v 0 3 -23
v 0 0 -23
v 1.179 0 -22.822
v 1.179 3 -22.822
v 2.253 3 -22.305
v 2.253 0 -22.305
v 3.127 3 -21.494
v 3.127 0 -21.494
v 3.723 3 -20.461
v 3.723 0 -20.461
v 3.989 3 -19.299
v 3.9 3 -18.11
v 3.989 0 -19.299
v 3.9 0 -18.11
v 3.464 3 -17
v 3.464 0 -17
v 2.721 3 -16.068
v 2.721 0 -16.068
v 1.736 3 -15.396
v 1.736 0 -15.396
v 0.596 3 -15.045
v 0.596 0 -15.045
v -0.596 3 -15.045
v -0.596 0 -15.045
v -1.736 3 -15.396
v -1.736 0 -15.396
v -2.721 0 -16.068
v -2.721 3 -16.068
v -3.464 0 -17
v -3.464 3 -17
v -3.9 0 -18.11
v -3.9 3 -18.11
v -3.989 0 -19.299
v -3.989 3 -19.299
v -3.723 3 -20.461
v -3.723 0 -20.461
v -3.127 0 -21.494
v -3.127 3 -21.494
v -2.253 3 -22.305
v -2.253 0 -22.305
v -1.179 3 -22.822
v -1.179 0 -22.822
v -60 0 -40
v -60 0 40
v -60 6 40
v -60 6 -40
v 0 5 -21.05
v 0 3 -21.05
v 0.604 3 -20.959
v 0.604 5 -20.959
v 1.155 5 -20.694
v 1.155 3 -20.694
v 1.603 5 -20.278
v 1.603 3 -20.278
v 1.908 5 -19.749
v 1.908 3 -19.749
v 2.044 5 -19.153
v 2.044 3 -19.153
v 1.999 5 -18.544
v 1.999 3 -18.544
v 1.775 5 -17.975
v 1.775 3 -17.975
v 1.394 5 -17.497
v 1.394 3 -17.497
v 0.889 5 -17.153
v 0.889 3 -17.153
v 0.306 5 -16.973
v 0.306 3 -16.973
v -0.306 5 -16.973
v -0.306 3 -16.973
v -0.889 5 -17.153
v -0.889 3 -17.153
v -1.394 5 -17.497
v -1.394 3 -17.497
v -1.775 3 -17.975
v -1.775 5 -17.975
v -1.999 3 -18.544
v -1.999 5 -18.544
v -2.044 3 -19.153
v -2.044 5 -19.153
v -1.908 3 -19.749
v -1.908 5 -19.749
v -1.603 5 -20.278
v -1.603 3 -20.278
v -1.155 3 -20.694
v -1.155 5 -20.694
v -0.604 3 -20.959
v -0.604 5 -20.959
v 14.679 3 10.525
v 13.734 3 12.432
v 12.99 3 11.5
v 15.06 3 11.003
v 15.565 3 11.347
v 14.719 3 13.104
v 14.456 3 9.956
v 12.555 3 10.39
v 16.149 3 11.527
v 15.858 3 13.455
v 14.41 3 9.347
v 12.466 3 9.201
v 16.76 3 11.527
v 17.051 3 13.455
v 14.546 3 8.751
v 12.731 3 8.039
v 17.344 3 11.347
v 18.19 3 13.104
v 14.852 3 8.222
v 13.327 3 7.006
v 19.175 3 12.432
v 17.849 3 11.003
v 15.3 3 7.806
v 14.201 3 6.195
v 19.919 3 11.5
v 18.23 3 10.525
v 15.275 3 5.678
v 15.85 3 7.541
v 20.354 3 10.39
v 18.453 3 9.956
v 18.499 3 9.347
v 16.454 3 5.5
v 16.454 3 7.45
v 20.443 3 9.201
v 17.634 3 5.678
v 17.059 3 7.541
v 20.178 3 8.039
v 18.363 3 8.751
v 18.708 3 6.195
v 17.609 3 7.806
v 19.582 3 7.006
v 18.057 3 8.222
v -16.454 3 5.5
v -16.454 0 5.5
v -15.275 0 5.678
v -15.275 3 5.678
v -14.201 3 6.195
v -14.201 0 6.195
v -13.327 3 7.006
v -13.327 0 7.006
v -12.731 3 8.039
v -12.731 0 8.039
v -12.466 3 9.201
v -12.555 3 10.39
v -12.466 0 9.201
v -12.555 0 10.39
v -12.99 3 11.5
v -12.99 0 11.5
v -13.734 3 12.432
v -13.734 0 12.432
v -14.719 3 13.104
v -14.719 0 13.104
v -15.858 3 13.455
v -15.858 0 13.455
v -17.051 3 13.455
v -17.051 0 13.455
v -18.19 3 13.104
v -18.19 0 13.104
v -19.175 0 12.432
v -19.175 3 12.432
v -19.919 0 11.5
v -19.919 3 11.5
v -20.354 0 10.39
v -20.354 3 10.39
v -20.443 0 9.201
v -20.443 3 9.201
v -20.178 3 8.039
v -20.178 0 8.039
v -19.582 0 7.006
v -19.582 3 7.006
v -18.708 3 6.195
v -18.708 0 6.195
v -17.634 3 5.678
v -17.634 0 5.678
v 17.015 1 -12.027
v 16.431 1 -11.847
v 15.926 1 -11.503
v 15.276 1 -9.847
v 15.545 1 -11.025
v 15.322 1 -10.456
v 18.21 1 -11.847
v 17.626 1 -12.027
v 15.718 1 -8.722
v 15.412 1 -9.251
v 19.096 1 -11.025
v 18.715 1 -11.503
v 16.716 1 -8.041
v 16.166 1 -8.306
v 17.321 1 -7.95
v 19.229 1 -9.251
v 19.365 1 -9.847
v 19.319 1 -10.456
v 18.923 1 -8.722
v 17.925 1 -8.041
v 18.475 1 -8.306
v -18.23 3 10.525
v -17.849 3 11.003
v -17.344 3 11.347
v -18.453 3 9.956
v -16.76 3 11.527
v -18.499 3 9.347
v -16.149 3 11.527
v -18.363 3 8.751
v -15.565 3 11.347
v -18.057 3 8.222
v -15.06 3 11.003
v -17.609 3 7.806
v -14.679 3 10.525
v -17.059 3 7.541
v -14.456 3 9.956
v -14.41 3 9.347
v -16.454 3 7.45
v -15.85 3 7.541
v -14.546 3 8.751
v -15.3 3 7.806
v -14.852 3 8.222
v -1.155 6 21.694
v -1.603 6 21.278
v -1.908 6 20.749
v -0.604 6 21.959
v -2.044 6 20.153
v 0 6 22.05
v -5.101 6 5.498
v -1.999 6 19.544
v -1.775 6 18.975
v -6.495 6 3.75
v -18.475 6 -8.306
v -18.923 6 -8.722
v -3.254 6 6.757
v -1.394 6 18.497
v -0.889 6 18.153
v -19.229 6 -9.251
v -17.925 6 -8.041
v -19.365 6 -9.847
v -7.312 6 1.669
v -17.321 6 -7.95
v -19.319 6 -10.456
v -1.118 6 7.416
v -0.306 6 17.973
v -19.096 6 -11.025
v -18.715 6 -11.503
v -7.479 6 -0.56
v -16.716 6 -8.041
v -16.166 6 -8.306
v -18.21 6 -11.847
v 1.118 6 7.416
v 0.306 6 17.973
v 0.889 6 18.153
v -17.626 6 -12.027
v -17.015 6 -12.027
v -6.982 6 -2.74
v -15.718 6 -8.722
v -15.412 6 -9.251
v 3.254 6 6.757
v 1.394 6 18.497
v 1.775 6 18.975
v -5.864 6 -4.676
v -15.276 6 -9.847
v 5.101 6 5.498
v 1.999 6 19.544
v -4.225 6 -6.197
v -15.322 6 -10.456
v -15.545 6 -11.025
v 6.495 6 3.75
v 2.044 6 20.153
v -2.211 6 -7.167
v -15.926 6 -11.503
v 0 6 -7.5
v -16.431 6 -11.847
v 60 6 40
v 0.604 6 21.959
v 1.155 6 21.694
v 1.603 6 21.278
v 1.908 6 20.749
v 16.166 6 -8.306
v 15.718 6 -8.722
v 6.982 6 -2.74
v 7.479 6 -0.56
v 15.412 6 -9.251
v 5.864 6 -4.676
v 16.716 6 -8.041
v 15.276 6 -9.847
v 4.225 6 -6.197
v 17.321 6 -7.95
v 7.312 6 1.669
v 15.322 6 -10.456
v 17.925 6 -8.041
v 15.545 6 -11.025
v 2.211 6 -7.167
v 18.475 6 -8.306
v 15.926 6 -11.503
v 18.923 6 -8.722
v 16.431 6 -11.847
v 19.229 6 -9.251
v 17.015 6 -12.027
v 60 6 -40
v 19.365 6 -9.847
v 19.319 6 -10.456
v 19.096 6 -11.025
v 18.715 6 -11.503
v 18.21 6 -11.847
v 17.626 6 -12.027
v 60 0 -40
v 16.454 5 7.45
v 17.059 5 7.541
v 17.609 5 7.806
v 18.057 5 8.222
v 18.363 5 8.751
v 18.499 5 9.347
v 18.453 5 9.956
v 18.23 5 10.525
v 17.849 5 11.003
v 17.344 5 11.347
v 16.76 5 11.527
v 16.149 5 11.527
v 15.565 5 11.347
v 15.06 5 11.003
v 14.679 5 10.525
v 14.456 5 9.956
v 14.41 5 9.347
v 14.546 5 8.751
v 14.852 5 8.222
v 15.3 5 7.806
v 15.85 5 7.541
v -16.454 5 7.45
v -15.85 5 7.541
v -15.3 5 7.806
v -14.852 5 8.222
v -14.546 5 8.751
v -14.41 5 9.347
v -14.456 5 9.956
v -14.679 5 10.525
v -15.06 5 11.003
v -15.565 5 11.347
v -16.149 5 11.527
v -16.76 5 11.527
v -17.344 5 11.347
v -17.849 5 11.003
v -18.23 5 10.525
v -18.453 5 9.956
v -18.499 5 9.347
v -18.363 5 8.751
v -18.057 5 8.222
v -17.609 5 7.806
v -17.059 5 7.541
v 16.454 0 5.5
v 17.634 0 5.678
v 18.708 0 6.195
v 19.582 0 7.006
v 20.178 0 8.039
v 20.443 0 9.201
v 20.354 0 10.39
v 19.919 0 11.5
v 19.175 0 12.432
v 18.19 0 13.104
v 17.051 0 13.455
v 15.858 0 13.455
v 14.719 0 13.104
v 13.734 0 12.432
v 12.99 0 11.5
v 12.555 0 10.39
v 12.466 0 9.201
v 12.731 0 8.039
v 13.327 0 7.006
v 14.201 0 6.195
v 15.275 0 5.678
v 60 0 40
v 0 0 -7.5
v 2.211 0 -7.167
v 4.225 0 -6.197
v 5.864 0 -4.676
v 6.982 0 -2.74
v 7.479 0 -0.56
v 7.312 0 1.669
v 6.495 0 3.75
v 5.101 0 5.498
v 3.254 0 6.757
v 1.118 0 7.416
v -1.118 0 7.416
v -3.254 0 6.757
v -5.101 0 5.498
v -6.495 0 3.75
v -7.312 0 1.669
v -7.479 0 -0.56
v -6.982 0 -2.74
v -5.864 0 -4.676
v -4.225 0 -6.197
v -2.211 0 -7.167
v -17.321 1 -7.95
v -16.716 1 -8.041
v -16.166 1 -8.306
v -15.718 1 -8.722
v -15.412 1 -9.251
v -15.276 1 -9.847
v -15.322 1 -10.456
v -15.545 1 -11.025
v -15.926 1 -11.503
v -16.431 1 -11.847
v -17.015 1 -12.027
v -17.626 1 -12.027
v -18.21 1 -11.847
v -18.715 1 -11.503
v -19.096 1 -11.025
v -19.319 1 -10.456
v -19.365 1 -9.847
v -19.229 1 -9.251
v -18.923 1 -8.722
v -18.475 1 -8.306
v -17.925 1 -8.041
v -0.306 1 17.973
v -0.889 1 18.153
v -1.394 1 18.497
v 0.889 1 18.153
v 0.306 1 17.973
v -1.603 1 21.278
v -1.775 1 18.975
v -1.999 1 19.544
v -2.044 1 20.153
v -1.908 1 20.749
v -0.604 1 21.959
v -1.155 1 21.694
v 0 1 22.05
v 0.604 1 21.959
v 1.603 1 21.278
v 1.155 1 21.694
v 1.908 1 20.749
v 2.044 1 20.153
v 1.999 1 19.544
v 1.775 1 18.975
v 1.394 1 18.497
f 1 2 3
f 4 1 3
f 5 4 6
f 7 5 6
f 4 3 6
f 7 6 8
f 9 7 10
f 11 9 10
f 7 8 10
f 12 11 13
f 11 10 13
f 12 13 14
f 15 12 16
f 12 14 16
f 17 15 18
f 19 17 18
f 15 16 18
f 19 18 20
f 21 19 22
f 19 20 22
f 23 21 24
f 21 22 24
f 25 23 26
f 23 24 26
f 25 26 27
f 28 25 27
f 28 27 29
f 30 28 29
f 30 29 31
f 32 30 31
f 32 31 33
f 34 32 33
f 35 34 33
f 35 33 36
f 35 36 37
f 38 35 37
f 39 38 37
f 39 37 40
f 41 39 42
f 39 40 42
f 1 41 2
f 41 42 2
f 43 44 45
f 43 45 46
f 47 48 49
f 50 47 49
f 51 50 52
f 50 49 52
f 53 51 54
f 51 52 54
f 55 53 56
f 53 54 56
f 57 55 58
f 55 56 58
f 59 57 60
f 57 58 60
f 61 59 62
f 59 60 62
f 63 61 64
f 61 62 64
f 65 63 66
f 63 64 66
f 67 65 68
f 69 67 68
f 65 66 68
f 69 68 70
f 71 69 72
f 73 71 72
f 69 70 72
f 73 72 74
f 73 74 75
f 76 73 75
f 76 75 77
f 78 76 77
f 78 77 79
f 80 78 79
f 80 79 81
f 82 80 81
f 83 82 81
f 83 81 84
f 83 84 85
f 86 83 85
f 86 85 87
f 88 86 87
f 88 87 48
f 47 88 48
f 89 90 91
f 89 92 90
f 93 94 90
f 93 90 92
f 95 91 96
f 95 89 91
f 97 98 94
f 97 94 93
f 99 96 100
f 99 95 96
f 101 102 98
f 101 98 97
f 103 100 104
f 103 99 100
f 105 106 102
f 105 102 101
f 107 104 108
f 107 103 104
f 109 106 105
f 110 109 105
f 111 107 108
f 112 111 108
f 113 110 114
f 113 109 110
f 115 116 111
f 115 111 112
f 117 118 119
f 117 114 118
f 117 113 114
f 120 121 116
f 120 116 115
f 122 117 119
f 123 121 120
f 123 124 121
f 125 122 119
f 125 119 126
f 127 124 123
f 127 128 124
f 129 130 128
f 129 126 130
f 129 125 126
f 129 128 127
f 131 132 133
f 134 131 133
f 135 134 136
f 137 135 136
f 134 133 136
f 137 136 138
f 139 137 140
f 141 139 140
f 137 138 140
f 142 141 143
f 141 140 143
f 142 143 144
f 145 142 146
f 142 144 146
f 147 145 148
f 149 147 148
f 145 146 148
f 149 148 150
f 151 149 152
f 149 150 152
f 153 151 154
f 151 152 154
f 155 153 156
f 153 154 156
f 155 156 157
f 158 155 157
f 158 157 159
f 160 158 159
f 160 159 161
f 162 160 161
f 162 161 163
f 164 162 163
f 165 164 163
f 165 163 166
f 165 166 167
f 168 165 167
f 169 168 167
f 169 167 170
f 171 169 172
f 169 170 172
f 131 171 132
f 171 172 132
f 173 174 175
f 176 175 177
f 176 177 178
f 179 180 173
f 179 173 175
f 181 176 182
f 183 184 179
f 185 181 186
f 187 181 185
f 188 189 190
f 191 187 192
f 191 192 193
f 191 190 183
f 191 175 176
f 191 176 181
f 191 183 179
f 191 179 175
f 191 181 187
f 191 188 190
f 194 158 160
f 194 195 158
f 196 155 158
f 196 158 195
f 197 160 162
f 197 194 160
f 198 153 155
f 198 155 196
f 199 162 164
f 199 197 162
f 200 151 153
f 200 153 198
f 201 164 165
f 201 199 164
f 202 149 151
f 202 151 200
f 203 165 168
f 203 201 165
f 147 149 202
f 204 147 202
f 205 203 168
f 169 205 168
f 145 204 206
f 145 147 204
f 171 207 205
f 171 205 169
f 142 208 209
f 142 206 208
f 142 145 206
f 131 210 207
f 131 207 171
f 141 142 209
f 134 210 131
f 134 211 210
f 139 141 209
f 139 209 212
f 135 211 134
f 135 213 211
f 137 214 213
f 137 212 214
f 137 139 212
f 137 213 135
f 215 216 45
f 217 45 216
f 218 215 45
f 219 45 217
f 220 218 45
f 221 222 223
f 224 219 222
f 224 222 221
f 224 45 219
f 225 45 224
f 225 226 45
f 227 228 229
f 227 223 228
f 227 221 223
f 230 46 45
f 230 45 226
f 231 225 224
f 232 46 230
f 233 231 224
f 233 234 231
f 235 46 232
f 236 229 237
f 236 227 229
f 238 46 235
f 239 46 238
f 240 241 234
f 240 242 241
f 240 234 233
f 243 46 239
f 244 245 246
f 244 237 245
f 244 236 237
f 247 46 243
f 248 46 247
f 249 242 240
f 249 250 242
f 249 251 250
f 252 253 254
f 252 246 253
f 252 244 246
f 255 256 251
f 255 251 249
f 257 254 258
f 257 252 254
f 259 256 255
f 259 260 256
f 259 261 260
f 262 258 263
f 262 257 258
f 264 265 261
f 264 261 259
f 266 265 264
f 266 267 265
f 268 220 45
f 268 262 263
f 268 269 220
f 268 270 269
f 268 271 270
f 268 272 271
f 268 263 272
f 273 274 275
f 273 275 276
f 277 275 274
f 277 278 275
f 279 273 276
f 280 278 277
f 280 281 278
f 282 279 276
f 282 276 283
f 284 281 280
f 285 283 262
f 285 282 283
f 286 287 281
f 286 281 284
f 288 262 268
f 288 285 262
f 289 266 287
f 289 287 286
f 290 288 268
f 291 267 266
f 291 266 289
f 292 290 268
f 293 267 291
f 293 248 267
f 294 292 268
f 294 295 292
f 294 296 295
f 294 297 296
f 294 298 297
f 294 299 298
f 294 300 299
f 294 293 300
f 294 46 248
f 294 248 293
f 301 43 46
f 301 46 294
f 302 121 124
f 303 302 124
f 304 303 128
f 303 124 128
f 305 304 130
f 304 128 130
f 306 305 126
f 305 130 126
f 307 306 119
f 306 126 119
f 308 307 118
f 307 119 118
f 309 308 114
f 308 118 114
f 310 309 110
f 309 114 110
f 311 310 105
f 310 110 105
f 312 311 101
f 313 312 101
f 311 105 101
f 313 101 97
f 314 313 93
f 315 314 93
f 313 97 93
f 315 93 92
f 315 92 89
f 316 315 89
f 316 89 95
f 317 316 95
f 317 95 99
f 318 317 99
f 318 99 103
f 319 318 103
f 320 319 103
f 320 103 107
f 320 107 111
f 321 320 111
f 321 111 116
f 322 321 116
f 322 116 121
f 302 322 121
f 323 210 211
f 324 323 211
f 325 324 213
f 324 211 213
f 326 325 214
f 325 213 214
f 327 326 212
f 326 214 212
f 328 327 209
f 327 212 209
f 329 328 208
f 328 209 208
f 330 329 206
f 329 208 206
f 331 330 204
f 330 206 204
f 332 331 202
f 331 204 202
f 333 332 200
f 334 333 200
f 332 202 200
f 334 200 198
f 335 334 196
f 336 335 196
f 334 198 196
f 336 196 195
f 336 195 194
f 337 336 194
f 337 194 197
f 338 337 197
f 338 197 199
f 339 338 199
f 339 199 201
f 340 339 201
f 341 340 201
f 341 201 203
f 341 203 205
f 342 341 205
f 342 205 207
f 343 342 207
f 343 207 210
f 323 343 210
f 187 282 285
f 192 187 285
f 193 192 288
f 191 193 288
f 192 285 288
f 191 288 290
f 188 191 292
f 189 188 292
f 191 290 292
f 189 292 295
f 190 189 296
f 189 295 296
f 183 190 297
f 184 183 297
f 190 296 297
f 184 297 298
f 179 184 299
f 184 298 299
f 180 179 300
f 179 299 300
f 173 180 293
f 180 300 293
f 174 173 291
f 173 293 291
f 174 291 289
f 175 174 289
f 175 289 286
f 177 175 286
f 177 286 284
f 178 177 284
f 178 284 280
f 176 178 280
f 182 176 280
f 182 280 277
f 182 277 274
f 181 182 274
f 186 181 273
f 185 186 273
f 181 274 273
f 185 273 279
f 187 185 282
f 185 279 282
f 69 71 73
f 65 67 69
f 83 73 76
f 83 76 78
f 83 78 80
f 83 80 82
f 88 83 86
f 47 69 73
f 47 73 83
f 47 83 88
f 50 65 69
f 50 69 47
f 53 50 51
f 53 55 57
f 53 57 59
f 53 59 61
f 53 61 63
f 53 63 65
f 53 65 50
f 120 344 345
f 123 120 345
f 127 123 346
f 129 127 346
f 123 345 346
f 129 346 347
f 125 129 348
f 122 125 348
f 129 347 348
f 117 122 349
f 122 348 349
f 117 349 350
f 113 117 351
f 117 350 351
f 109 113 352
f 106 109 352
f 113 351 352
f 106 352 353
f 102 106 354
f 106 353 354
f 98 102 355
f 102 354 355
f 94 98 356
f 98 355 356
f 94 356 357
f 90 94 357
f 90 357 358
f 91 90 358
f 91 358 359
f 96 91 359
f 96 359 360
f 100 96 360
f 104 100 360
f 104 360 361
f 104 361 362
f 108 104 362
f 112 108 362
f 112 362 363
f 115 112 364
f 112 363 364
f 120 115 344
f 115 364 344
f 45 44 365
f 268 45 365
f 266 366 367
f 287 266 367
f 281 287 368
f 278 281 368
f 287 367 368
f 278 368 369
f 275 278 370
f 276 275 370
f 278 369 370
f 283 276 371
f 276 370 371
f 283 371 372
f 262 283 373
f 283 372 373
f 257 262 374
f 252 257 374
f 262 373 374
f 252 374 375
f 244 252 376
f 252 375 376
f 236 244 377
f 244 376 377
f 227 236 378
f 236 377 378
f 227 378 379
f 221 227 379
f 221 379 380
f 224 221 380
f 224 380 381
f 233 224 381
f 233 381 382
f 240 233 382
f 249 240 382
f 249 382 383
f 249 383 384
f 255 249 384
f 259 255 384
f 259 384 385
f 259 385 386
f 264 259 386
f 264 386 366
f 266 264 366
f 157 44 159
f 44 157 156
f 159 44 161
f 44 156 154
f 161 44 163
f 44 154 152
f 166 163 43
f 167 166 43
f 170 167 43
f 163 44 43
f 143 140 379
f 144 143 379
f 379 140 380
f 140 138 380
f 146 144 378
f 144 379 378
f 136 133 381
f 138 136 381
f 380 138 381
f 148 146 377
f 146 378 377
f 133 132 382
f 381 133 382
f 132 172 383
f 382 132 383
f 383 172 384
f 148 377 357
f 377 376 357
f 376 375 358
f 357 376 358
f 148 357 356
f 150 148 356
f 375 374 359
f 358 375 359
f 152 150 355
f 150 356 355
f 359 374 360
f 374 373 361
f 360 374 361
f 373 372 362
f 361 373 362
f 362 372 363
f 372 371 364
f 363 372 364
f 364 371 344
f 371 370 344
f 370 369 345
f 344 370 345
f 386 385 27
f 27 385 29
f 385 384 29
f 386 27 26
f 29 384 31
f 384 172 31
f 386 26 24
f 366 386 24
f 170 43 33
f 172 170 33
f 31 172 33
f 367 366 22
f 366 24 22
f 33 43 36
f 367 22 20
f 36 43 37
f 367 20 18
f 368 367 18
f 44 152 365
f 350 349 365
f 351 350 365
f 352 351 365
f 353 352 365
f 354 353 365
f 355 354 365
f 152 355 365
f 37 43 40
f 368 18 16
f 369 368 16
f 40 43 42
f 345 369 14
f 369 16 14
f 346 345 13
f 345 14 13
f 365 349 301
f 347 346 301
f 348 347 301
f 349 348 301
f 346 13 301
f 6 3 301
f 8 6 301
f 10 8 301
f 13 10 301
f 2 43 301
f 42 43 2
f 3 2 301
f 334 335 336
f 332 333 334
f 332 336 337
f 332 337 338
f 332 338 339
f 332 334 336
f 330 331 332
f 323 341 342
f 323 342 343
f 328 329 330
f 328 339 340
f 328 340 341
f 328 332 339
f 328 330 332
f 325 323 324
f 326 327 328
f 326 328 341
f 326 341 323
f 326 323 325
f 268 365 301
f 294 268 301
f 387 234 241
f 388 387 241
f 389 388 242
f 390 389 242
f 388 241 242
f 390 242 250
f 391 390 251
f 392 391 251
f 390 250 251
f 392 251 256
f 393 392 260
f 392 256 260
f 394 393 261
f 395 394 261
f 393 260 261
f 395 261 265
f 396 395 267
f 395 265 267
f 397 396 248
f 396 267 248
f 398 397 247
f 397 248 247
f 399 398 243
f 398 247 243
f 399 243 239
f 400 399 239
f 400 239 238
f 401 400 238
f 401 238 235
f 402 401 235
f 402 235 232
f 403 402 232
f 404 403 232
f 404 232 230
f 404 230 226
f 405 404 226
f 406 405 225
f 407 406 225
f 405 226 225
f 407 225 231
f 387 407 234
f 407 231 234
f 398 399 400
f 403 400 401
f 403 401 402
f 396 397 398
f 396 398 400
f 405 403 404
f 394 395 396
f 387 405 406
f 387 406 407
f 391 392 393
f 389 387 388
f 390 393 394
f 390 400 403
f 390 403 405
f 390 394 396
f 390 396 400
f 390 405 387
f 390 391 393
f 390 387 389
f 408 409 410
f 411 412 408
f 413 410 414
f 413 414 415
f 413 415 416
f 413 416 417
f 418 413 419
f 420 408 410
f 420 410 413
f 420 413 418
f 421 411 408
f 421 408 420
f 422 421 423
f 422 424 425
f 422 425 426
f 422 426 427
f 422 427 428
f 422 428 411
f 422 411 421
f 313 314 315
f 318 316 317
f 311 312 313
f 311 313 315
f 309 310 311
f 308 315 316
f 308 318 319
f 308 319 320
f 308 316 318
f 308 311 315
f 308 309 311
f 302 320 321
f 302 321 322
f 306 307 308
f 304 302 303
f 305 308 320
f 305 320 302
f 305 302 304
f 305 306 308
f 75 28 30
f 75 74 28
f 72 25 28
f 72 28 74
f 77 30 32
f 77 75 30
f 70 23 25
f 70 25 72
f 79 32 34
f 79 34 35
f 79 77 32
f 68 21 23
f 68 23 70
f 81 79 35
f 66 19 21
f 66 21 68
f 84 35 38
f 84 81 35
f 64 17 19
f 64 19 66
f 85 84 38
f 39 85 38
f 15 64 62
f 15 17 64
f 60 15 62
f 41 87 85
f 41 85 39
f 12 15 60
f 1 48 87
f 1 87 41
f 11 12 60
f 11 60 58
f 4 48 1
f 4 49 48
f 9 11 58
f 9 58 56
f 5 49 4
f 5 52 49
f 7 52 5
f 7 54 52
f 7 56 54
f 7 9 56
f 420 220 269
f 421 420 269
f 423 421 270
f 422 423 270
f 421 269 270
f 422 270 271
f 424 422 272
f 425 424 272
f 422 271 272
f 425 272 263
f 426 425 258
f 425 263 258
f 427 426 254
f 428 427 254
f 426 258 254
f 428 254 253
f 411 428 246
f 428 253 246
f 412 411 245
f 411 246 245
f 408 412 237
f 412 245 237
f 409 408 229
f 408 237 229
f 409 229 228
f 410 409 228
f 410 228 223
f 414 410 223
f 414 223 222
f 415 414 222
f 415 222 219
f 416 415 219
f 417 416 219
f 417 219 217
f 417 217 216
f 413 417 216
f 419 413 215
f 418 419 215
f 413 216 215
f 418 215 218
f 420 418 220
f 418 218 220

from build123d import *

# Parameters (mm, degrees)
SKETCH_1_W              = 120
SKETCH_1_H              = 80
EXTRUDE_1_DEPTH         = 6
SKETCH_3_R              = 2.05
CUT_EXTRUDE_4_1_1_DEPTH = 5
SKETCH_4_R              = 2.05
CUT_EXTRUDE_4_1_2_DEPTH = 5
SKETCH_5_R              = 4
CUT_EXTRUDE_3_DEPTH     = 3
SKETCH_6_R              = 7.5
CUT_EXTRUDE_4_DEPTH     = 10


with BuildPart() as part:
    # 草图1 → 凸台-拉伸1 (new body)
    with BuildSketch(Plane(origin=(0, 0, 0), x_dir=(1, 0, 0), z_dir=(0, 1, 0))):
        Rectangle(SKETCH_1_W, SKETCH_1_H)
    extrude(amount=EXTRUDE_1_DEPTH)

    # 草图3 → φ4.1孔1 (cut)
    with BuildSketch(Plane(origin=(0, 6, 0), x_dir=(1, 0, 0), z_dir=(0, 1, 0))):
        with Locations(Location((0, -20, 0), (0, 0, 270))):
            Circle(SKETCH_3_R)
        with Locations(Location((-17.320508076, 10, 0), (0, 0, 270))):
            Circle(SKETCH_3_R)
        with Locations(Location((17.320508076, 10, 0), (0, 0, 270))):
            Circle(SKETCH_3_R)
    extrude(amount=-CUT_EXTRUDE_4_1_1_DEPTH, mode=Mode.SUBTRACT)

    # 草图4 → φ4.1孔2 (cut)
    with BuildSketch(Plane.XZ):
        with Locations(Location((-16.454482672, 9.5, 0), (0, 0, 270))):
            Circle(SKETCH_4_R)
        with Locations(Location((16.454482672, 9.5, 0), (0, 0, 270))):
            Circle(SKETCH_4_R)
        with Locations(Location((0, -19, 0), (0, 0, 270))):
            Circle(SKETCH_4_R)
    extrude(amount=-CUT_EXTRUDE_4_1_2_DEPTH, mode=Mode.SUBTRACT)

    # 草图5 → 切除-拉伸3 (cut)
    with BuildSketch(Plane.XZ):
        with Locations(Location((-16.454482672, 9.5, 0), (0, 0, 270))):
            Circle(SKETCH_5_R)
        with Locations(Location((16.454482672, 9.5, 0), (0, 0, 270))):
            Circle(SKETCH_5_R)
        with Locations(Location((0, -19, 0), (0, 0, 270))):
            Circle(SKETCH_5_R)
    extrude(amount=-CUT_EXTRUDE_3_DEPTH, mode=Mode.SUBTRACT)

    # 草图6 → 切除-拉伸4 (cut)
    with BuildSketch(Plane.XZ):
        with Locations(Location((0, 0, 0), (0, 0, 270))):
            Circle(SKETCH_6_R)
    extrude(amount=-CUT_EXTRUDE_4_DEPTH, mode=Mode.SUBTRACT)


solid = part.part
